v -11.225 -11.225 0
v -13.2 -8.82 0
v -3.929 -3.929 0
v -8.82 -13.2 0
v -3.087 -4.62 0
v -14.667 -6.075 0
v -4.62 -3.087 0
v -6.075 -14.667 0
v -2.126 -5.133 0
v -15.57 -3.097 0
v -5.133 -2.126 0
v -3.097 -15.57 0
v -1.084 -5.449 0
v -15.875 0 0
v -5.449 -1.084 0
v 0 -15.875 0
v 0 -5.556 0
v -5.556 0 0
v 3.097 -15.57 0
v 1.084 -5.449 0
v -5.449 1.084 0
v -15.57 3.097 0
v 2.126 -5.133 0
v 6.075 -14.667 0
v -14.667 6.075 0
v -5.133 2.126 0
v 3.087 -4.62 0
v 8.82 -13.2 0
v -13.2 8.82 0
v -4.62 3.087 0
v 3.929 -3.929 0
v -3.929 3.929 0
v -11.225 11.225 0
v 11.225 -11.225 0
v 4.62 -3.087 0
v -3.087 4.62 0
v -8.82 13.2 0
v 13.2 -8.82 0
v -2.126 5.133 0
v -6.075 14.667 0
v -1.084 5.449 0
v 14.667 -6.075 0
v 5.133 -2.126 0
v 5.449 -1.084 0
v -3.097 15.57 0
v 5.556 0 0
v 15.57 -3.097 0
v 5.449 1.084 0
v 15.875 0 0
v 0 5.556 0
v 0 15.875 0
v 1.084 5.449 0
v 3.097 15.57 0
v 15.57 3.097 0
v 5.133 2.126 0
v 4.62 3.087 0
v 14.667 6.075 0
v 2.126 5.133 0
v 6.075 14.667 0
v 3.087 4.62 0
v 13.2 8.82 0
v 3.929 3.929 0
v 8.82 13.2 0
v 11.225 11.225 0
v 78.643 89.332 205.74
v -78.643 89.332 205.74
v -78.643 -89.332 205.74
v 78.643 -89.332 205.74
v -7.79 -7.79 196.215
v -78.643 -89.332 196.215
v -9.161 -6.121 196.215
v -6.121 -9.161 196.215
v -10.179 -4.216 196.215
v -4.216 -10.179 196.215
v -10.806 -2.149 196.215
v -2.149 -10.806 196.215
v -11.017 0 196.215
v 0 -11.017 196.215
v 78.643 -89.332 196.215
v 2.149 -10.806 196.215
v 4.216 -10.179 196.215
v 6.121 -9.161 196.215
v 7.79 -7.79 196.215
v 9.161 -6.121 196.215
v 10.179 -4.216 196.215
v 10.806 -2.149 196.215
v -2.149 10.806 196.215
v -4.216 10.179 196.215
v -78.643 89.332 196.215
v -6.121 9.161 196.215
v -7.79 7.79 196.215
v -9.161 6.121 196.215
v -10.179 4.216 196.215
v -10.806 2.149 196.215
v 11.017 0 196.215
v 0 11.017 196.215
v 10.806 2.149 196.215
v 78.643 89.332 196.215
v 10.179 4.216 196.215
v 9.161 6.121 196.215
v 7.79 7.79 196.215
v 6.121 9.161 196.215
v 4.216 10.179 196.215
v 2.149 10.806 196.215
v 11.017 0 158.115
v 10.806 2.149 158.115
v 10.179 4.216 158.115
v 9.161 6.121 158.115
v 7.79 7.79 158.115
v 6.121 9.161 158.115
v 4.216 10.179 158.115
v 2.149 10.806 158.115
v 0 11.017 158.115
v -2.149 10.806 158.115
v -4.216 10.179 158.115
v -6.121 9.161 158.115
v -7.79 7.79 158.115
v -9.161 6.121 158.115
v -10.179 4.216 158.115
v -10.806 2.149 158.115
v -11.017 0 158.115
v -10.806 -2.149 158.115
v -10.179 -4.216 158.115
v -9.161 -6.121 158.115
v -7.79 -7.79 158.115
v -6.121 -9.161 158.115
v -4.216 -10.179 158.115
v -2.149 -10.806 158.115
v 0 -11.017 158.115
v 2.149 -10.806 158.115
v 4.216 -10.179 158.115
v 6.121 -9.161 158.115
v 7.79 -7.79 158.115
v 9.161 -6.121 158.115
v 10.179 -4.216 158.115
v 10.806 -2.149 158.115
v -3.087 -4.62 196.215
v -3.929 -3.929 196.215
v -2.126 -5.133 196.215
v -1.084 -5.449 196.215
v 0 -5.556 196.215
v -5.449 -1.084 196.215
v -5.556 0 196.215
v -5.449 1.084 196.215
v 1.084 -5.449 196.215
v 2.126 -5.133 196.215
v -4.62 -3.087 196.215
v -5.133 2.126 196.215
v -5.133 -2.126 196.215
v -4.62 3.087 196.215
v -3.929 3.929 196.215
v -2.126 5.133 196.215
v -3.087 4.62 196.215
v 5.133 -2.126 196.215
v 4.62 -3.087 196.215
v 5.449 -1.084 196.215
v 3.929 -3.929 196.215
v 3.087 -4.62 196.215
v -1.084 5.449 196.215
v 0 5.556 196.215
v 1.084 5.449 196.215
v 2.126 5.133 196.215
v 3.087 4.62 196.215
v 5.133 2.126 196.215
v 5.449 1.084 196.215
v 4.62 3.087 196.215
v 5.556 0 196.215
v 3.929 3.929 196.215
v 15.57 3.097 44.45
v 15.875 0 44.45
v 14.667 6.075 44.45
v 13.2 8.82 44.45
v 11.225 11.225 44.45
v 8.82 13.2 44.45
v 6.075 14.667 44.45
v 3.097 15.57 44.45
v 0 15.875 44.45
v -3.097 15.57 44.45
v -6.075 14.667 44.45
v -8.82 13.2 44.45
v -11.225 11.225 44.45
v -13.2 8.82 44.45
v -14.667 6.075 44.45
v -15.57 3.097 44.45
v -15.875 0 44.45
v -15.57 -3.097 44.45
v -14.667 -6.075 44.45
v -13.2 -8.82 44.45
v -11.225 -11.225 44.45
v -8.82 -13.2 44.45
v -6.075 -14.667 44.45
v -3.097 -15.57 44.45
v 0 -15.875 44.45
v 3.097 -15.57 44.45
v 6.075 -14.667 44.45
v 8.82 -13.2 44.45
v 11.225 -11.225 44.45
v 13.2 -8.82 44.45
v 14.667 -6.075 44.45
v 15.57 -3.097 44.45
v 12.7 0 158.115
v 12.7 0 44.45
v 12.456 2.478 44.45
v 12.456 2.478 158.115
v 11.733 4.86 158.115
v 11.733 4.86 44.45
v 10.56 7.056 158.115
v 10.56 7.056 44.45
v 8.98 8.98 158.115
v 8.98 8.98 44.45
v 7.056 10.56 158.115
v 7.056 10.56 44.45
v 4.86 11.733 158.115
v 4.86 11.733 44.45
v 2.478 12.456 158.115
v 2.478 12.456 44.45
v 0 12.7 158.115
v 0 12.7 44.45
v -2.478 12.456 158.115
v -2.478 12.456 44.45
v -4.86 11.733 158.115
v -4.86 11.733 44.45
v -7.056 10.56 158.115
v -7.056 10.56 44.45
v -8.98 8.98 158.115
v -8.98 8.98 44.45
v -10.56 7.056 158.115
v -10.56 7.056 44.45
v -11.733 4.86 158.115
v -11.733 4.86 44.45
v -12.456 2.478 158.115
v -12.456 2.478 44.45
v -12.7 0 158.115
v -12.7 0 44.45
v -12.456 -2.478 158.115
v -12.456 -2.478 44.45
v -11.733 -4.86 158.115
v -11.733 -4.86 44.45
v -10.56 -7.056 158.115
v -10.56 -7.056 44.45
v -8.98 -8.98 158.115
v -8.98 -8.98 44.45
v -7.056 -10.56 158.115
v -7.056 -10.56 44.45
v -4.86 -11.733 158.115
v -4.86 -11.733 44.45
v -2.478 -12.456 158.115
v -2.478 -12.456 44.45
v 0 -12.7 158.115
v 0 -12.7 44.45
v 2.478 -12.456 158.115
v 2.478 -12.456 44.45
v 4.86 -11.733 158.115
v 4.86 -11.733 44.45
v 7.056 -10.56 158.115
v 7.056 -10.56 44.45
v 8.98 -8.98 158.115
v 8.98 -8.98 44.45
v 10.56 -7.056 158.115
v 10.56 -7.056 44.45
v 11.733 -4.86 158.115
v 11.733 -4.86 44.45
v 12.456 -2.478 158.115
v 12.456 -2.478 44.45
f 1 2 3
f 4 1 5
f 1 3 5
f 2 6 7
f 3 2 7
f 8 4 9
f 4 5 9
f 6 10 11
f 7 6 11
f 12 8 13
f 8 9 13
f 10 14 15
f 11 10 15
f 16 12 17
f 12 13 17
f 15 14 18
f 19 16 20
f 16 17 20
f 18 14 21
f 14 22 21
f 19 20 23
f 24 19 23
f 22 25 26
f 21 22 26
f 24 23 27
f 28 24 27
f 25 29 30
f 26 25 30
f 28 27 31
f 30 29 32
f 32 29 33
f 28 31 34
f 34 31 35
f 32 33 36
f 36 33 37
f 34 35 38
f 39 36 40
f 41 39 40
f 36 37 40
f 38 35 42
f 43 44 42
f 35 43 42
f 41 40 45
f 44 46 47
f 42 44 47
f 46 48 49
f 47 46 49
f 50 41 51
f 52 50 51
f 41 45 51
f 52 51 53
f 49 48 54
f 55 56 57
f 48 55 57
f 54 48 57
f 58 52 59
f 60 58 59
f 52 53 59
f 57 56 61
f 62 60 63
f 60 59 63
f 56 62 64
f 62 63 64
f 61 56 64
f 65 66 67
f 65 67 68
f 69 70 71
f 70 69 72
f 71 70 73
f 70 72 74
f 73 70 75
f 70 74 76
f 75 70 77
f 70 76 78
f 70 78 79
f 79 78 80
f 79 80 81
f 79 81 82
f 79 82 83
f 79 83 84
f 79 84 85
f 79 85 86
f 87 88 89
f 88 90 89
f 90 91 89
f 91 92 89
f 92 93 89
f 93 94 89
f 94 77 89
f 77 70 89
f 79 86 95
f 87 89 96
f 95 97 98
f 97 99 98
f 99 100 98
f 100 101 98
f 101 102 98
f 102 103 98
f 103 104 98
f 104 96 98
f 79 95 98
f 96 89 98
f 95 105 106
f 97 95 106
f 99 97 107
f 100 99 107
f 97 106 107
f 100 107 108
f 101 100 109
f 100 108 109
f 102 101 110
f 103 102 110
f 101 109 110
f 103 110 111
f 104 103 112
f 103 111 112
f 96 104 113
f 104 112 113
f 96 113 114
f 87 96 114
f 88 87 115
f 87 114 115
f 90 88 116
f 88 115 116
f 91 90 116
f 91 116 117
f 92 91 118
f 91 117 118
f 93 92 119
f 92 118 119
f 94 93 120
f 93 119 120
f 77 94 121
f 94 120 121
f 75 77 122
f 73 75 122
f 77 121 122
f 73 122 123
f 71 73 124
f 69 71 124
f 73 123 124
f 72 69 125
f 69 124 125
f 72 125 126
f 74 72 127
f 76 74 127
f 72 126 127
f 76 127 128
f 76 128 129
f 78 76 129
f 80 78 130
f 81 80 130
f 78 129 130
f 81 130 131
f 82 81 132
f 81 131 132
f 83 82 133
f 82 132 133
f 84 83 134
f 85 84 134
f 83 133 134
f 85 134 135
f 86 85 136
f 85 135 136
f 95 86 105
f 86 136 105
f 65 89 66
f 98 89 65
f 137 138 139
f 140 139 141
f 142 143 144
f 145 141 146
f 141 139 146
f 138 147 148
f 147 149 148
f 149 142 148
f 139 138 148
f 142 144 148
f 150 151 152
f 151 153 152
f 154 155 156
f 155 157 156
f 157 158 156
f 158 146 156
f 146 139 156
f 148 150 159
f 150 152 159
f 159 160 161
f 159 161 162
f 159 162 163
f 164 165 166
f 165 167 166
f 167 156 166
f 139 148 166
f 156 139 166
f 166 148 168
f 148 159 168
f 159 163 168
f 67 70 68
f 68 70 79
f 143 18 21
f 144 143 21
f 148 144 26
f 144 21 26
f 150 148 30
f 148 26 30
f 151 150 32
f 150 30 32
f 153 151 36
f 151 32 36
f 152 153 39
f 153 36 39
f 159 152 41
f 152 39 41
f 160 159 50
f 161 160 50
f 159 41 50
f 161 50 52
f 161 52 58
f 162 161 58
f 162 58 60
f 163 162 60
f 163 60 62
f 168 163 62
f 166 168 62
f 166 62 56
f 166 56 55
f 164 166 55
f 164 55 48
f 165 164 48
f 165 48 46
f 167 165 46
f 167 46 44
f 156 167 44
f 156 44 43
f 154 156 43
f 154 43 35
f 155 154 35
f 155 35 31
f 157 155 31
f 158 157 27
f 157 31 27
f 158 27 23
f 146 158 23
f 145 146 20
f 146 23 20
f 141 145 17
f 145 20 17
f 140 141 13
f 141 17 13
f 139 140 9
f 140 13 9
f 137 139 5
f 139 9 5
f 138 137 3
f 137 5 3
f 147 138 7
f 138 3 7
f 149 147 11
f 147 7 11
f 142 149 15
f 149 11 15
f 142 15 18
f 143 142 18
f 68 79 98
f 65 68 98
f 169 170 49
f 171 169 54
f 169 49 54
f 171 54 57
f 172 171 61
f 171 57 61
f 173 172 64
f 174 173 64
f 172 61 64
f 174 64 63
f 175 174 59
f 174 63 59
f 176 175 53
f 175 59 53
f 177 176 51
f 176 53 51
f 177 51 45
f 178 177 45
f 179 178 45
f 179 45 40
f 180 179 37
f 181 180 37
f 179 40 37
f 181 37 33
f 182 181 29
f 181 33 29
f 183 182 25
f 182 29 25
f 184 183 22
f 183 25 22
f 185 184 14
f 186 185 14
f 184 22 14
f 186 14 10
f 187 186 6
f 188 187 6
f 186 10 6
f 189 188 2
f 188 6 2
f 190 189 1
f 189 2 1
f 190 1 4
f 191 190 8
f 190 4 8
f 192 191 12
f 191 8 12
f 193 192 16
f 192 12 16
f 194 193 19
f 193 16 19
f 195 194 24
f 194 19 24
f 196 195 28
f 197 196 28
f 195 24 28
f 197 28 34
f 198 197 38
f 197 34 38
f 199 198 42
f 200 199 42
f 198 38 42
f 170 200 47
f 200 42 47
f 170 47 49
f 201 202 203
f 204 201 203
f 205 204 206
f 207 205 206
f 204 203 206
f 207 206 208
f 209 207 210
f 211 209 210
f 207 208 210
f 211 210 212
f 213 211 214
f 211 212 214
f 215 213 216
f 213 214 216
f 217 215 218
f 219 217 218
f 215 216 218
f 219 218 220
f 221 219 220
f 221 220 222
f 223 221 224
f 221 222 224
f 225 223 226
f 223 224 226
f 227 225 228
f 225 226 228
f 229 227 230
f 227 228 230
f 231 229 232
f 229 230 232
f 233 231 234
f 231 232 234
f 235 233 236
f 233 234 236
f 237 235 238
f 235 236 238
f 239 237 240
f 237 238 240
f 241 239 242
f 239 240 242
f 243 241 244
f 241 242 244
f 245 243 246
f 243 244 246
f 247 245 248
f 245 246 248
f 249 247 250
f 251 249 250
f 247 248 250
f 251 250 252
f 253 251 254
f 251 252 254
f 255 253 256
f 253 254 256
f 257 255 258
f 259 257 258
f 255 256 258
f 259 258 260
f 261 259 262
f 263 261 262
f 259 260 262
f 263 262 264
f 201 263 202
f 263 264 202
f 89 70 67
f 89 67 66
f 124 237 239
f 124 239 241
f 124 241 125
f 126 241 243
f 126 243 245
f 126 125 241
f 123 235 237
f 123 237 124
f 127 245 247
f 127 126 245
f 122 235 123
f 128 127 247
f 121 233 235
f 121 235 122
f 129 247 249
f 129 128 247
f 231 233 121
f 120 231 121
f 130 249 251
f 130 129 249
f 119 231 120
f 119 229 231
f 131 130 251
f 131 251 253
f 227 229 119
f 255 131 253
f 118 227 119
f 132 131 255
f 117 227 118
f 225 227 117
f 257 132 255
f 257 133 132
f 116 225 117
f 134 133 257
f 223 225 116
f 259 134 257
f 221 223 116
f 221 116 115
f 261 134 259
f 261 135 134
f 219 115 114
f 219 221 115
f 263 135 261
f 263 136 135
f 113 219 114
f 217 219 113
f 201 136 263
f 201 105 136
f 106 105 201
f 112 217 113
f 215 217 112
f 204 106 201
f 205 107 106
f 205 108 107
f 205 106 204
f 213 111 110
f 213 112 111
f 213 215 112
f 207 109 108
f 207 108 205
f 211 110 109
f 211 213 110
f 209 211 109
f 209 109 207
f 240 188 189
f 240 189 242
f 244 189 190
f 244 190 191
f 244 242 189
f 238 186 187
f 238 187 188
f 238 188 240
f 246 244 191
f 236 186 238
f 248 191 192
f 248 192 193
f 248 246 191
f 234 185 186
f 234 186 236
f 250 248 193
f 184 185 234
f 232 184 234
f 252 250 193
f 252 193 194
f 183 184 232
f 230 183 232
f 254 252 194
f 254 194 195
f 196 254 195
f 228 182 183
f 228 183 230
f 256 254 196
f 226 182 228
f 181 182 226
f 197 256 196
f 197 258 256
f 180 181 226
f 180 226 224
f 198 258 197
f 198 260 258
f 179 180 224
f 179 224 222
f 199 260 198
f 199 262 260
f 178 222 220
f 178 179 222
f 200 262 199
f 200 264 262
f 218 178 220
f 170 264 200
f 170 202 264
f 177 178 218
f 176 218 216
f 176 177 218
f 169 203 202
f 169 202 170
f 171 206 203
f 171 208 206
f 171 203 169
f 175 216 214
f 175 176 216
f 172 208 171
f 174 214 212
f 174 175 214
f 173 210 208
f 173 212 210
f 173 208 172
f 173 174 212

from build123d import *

# Parameters (mm, degrees)
SKETCH2_R           = 15.875
BOSS_EXTRUDE1_DEPTH = 44.45
SKETCH3_R           = 12.7
BOSS_EXTRUDE2_DEPTH = 113.665
SKETCH4_R           = 11.01725
BOSS_EXTRUDE3_DEPTH = 38.1
SKETCH6_R           = 5.55625
CUT_EXTRUDE1_DEPTH  = 215.9
SKETCH8_W           = 157.285598566
SKETCH8_H           = 178.663022366
BOSS_EXTRUDE5_DEPTH = 9.525


with BuildPart() as part:
    # Sketch2 → Boss-Extrude1 (new body)
    with BuildSketch(Plane.XY):
        Circle(SKETCH2_R)
    extrude(amount=BOSS_EXTRUDE1_DEPTH)

    # Sketch3 → Boss-Extrude2 (add)
    with BuildSketch(Plane.XY.offset(44.45)):
        Circle(SKETCH3_R)
    extrude(amount=BOSS_EXTRUDE2_DEPTH)

    # Sketch4 → Boss-Extrude3 (add)
    with BuildSketch(Plane.XY.offset(158.115)):
        Circle(SKETCH4_R)
    extrude(amount=BOSS_EXTRUDE3_DEPTH)

    # Sketch6 → Cut-Extrude1 (cut)
    with BuildSketch(Plane(origin=(0, 0, 0), x_dir=(-1, 0, 0), z_dir=(0, 0, -1))):
        Circle(SKETCH6_R)
    extrude(amount=-CUT_EXTRUDE1_DEPTH, mode=Mode.SUBTRACT)

    # Sketch8 → Boss-Extrude5 (add)
    with BuildSketch(Plane.XY.offset(196.215)):
        Rectangle(SKETCH8_W, SKETCH8_H)
    extrude(amount=BOSS_EXTRUDE5_DEPTH)


solid = part.part
